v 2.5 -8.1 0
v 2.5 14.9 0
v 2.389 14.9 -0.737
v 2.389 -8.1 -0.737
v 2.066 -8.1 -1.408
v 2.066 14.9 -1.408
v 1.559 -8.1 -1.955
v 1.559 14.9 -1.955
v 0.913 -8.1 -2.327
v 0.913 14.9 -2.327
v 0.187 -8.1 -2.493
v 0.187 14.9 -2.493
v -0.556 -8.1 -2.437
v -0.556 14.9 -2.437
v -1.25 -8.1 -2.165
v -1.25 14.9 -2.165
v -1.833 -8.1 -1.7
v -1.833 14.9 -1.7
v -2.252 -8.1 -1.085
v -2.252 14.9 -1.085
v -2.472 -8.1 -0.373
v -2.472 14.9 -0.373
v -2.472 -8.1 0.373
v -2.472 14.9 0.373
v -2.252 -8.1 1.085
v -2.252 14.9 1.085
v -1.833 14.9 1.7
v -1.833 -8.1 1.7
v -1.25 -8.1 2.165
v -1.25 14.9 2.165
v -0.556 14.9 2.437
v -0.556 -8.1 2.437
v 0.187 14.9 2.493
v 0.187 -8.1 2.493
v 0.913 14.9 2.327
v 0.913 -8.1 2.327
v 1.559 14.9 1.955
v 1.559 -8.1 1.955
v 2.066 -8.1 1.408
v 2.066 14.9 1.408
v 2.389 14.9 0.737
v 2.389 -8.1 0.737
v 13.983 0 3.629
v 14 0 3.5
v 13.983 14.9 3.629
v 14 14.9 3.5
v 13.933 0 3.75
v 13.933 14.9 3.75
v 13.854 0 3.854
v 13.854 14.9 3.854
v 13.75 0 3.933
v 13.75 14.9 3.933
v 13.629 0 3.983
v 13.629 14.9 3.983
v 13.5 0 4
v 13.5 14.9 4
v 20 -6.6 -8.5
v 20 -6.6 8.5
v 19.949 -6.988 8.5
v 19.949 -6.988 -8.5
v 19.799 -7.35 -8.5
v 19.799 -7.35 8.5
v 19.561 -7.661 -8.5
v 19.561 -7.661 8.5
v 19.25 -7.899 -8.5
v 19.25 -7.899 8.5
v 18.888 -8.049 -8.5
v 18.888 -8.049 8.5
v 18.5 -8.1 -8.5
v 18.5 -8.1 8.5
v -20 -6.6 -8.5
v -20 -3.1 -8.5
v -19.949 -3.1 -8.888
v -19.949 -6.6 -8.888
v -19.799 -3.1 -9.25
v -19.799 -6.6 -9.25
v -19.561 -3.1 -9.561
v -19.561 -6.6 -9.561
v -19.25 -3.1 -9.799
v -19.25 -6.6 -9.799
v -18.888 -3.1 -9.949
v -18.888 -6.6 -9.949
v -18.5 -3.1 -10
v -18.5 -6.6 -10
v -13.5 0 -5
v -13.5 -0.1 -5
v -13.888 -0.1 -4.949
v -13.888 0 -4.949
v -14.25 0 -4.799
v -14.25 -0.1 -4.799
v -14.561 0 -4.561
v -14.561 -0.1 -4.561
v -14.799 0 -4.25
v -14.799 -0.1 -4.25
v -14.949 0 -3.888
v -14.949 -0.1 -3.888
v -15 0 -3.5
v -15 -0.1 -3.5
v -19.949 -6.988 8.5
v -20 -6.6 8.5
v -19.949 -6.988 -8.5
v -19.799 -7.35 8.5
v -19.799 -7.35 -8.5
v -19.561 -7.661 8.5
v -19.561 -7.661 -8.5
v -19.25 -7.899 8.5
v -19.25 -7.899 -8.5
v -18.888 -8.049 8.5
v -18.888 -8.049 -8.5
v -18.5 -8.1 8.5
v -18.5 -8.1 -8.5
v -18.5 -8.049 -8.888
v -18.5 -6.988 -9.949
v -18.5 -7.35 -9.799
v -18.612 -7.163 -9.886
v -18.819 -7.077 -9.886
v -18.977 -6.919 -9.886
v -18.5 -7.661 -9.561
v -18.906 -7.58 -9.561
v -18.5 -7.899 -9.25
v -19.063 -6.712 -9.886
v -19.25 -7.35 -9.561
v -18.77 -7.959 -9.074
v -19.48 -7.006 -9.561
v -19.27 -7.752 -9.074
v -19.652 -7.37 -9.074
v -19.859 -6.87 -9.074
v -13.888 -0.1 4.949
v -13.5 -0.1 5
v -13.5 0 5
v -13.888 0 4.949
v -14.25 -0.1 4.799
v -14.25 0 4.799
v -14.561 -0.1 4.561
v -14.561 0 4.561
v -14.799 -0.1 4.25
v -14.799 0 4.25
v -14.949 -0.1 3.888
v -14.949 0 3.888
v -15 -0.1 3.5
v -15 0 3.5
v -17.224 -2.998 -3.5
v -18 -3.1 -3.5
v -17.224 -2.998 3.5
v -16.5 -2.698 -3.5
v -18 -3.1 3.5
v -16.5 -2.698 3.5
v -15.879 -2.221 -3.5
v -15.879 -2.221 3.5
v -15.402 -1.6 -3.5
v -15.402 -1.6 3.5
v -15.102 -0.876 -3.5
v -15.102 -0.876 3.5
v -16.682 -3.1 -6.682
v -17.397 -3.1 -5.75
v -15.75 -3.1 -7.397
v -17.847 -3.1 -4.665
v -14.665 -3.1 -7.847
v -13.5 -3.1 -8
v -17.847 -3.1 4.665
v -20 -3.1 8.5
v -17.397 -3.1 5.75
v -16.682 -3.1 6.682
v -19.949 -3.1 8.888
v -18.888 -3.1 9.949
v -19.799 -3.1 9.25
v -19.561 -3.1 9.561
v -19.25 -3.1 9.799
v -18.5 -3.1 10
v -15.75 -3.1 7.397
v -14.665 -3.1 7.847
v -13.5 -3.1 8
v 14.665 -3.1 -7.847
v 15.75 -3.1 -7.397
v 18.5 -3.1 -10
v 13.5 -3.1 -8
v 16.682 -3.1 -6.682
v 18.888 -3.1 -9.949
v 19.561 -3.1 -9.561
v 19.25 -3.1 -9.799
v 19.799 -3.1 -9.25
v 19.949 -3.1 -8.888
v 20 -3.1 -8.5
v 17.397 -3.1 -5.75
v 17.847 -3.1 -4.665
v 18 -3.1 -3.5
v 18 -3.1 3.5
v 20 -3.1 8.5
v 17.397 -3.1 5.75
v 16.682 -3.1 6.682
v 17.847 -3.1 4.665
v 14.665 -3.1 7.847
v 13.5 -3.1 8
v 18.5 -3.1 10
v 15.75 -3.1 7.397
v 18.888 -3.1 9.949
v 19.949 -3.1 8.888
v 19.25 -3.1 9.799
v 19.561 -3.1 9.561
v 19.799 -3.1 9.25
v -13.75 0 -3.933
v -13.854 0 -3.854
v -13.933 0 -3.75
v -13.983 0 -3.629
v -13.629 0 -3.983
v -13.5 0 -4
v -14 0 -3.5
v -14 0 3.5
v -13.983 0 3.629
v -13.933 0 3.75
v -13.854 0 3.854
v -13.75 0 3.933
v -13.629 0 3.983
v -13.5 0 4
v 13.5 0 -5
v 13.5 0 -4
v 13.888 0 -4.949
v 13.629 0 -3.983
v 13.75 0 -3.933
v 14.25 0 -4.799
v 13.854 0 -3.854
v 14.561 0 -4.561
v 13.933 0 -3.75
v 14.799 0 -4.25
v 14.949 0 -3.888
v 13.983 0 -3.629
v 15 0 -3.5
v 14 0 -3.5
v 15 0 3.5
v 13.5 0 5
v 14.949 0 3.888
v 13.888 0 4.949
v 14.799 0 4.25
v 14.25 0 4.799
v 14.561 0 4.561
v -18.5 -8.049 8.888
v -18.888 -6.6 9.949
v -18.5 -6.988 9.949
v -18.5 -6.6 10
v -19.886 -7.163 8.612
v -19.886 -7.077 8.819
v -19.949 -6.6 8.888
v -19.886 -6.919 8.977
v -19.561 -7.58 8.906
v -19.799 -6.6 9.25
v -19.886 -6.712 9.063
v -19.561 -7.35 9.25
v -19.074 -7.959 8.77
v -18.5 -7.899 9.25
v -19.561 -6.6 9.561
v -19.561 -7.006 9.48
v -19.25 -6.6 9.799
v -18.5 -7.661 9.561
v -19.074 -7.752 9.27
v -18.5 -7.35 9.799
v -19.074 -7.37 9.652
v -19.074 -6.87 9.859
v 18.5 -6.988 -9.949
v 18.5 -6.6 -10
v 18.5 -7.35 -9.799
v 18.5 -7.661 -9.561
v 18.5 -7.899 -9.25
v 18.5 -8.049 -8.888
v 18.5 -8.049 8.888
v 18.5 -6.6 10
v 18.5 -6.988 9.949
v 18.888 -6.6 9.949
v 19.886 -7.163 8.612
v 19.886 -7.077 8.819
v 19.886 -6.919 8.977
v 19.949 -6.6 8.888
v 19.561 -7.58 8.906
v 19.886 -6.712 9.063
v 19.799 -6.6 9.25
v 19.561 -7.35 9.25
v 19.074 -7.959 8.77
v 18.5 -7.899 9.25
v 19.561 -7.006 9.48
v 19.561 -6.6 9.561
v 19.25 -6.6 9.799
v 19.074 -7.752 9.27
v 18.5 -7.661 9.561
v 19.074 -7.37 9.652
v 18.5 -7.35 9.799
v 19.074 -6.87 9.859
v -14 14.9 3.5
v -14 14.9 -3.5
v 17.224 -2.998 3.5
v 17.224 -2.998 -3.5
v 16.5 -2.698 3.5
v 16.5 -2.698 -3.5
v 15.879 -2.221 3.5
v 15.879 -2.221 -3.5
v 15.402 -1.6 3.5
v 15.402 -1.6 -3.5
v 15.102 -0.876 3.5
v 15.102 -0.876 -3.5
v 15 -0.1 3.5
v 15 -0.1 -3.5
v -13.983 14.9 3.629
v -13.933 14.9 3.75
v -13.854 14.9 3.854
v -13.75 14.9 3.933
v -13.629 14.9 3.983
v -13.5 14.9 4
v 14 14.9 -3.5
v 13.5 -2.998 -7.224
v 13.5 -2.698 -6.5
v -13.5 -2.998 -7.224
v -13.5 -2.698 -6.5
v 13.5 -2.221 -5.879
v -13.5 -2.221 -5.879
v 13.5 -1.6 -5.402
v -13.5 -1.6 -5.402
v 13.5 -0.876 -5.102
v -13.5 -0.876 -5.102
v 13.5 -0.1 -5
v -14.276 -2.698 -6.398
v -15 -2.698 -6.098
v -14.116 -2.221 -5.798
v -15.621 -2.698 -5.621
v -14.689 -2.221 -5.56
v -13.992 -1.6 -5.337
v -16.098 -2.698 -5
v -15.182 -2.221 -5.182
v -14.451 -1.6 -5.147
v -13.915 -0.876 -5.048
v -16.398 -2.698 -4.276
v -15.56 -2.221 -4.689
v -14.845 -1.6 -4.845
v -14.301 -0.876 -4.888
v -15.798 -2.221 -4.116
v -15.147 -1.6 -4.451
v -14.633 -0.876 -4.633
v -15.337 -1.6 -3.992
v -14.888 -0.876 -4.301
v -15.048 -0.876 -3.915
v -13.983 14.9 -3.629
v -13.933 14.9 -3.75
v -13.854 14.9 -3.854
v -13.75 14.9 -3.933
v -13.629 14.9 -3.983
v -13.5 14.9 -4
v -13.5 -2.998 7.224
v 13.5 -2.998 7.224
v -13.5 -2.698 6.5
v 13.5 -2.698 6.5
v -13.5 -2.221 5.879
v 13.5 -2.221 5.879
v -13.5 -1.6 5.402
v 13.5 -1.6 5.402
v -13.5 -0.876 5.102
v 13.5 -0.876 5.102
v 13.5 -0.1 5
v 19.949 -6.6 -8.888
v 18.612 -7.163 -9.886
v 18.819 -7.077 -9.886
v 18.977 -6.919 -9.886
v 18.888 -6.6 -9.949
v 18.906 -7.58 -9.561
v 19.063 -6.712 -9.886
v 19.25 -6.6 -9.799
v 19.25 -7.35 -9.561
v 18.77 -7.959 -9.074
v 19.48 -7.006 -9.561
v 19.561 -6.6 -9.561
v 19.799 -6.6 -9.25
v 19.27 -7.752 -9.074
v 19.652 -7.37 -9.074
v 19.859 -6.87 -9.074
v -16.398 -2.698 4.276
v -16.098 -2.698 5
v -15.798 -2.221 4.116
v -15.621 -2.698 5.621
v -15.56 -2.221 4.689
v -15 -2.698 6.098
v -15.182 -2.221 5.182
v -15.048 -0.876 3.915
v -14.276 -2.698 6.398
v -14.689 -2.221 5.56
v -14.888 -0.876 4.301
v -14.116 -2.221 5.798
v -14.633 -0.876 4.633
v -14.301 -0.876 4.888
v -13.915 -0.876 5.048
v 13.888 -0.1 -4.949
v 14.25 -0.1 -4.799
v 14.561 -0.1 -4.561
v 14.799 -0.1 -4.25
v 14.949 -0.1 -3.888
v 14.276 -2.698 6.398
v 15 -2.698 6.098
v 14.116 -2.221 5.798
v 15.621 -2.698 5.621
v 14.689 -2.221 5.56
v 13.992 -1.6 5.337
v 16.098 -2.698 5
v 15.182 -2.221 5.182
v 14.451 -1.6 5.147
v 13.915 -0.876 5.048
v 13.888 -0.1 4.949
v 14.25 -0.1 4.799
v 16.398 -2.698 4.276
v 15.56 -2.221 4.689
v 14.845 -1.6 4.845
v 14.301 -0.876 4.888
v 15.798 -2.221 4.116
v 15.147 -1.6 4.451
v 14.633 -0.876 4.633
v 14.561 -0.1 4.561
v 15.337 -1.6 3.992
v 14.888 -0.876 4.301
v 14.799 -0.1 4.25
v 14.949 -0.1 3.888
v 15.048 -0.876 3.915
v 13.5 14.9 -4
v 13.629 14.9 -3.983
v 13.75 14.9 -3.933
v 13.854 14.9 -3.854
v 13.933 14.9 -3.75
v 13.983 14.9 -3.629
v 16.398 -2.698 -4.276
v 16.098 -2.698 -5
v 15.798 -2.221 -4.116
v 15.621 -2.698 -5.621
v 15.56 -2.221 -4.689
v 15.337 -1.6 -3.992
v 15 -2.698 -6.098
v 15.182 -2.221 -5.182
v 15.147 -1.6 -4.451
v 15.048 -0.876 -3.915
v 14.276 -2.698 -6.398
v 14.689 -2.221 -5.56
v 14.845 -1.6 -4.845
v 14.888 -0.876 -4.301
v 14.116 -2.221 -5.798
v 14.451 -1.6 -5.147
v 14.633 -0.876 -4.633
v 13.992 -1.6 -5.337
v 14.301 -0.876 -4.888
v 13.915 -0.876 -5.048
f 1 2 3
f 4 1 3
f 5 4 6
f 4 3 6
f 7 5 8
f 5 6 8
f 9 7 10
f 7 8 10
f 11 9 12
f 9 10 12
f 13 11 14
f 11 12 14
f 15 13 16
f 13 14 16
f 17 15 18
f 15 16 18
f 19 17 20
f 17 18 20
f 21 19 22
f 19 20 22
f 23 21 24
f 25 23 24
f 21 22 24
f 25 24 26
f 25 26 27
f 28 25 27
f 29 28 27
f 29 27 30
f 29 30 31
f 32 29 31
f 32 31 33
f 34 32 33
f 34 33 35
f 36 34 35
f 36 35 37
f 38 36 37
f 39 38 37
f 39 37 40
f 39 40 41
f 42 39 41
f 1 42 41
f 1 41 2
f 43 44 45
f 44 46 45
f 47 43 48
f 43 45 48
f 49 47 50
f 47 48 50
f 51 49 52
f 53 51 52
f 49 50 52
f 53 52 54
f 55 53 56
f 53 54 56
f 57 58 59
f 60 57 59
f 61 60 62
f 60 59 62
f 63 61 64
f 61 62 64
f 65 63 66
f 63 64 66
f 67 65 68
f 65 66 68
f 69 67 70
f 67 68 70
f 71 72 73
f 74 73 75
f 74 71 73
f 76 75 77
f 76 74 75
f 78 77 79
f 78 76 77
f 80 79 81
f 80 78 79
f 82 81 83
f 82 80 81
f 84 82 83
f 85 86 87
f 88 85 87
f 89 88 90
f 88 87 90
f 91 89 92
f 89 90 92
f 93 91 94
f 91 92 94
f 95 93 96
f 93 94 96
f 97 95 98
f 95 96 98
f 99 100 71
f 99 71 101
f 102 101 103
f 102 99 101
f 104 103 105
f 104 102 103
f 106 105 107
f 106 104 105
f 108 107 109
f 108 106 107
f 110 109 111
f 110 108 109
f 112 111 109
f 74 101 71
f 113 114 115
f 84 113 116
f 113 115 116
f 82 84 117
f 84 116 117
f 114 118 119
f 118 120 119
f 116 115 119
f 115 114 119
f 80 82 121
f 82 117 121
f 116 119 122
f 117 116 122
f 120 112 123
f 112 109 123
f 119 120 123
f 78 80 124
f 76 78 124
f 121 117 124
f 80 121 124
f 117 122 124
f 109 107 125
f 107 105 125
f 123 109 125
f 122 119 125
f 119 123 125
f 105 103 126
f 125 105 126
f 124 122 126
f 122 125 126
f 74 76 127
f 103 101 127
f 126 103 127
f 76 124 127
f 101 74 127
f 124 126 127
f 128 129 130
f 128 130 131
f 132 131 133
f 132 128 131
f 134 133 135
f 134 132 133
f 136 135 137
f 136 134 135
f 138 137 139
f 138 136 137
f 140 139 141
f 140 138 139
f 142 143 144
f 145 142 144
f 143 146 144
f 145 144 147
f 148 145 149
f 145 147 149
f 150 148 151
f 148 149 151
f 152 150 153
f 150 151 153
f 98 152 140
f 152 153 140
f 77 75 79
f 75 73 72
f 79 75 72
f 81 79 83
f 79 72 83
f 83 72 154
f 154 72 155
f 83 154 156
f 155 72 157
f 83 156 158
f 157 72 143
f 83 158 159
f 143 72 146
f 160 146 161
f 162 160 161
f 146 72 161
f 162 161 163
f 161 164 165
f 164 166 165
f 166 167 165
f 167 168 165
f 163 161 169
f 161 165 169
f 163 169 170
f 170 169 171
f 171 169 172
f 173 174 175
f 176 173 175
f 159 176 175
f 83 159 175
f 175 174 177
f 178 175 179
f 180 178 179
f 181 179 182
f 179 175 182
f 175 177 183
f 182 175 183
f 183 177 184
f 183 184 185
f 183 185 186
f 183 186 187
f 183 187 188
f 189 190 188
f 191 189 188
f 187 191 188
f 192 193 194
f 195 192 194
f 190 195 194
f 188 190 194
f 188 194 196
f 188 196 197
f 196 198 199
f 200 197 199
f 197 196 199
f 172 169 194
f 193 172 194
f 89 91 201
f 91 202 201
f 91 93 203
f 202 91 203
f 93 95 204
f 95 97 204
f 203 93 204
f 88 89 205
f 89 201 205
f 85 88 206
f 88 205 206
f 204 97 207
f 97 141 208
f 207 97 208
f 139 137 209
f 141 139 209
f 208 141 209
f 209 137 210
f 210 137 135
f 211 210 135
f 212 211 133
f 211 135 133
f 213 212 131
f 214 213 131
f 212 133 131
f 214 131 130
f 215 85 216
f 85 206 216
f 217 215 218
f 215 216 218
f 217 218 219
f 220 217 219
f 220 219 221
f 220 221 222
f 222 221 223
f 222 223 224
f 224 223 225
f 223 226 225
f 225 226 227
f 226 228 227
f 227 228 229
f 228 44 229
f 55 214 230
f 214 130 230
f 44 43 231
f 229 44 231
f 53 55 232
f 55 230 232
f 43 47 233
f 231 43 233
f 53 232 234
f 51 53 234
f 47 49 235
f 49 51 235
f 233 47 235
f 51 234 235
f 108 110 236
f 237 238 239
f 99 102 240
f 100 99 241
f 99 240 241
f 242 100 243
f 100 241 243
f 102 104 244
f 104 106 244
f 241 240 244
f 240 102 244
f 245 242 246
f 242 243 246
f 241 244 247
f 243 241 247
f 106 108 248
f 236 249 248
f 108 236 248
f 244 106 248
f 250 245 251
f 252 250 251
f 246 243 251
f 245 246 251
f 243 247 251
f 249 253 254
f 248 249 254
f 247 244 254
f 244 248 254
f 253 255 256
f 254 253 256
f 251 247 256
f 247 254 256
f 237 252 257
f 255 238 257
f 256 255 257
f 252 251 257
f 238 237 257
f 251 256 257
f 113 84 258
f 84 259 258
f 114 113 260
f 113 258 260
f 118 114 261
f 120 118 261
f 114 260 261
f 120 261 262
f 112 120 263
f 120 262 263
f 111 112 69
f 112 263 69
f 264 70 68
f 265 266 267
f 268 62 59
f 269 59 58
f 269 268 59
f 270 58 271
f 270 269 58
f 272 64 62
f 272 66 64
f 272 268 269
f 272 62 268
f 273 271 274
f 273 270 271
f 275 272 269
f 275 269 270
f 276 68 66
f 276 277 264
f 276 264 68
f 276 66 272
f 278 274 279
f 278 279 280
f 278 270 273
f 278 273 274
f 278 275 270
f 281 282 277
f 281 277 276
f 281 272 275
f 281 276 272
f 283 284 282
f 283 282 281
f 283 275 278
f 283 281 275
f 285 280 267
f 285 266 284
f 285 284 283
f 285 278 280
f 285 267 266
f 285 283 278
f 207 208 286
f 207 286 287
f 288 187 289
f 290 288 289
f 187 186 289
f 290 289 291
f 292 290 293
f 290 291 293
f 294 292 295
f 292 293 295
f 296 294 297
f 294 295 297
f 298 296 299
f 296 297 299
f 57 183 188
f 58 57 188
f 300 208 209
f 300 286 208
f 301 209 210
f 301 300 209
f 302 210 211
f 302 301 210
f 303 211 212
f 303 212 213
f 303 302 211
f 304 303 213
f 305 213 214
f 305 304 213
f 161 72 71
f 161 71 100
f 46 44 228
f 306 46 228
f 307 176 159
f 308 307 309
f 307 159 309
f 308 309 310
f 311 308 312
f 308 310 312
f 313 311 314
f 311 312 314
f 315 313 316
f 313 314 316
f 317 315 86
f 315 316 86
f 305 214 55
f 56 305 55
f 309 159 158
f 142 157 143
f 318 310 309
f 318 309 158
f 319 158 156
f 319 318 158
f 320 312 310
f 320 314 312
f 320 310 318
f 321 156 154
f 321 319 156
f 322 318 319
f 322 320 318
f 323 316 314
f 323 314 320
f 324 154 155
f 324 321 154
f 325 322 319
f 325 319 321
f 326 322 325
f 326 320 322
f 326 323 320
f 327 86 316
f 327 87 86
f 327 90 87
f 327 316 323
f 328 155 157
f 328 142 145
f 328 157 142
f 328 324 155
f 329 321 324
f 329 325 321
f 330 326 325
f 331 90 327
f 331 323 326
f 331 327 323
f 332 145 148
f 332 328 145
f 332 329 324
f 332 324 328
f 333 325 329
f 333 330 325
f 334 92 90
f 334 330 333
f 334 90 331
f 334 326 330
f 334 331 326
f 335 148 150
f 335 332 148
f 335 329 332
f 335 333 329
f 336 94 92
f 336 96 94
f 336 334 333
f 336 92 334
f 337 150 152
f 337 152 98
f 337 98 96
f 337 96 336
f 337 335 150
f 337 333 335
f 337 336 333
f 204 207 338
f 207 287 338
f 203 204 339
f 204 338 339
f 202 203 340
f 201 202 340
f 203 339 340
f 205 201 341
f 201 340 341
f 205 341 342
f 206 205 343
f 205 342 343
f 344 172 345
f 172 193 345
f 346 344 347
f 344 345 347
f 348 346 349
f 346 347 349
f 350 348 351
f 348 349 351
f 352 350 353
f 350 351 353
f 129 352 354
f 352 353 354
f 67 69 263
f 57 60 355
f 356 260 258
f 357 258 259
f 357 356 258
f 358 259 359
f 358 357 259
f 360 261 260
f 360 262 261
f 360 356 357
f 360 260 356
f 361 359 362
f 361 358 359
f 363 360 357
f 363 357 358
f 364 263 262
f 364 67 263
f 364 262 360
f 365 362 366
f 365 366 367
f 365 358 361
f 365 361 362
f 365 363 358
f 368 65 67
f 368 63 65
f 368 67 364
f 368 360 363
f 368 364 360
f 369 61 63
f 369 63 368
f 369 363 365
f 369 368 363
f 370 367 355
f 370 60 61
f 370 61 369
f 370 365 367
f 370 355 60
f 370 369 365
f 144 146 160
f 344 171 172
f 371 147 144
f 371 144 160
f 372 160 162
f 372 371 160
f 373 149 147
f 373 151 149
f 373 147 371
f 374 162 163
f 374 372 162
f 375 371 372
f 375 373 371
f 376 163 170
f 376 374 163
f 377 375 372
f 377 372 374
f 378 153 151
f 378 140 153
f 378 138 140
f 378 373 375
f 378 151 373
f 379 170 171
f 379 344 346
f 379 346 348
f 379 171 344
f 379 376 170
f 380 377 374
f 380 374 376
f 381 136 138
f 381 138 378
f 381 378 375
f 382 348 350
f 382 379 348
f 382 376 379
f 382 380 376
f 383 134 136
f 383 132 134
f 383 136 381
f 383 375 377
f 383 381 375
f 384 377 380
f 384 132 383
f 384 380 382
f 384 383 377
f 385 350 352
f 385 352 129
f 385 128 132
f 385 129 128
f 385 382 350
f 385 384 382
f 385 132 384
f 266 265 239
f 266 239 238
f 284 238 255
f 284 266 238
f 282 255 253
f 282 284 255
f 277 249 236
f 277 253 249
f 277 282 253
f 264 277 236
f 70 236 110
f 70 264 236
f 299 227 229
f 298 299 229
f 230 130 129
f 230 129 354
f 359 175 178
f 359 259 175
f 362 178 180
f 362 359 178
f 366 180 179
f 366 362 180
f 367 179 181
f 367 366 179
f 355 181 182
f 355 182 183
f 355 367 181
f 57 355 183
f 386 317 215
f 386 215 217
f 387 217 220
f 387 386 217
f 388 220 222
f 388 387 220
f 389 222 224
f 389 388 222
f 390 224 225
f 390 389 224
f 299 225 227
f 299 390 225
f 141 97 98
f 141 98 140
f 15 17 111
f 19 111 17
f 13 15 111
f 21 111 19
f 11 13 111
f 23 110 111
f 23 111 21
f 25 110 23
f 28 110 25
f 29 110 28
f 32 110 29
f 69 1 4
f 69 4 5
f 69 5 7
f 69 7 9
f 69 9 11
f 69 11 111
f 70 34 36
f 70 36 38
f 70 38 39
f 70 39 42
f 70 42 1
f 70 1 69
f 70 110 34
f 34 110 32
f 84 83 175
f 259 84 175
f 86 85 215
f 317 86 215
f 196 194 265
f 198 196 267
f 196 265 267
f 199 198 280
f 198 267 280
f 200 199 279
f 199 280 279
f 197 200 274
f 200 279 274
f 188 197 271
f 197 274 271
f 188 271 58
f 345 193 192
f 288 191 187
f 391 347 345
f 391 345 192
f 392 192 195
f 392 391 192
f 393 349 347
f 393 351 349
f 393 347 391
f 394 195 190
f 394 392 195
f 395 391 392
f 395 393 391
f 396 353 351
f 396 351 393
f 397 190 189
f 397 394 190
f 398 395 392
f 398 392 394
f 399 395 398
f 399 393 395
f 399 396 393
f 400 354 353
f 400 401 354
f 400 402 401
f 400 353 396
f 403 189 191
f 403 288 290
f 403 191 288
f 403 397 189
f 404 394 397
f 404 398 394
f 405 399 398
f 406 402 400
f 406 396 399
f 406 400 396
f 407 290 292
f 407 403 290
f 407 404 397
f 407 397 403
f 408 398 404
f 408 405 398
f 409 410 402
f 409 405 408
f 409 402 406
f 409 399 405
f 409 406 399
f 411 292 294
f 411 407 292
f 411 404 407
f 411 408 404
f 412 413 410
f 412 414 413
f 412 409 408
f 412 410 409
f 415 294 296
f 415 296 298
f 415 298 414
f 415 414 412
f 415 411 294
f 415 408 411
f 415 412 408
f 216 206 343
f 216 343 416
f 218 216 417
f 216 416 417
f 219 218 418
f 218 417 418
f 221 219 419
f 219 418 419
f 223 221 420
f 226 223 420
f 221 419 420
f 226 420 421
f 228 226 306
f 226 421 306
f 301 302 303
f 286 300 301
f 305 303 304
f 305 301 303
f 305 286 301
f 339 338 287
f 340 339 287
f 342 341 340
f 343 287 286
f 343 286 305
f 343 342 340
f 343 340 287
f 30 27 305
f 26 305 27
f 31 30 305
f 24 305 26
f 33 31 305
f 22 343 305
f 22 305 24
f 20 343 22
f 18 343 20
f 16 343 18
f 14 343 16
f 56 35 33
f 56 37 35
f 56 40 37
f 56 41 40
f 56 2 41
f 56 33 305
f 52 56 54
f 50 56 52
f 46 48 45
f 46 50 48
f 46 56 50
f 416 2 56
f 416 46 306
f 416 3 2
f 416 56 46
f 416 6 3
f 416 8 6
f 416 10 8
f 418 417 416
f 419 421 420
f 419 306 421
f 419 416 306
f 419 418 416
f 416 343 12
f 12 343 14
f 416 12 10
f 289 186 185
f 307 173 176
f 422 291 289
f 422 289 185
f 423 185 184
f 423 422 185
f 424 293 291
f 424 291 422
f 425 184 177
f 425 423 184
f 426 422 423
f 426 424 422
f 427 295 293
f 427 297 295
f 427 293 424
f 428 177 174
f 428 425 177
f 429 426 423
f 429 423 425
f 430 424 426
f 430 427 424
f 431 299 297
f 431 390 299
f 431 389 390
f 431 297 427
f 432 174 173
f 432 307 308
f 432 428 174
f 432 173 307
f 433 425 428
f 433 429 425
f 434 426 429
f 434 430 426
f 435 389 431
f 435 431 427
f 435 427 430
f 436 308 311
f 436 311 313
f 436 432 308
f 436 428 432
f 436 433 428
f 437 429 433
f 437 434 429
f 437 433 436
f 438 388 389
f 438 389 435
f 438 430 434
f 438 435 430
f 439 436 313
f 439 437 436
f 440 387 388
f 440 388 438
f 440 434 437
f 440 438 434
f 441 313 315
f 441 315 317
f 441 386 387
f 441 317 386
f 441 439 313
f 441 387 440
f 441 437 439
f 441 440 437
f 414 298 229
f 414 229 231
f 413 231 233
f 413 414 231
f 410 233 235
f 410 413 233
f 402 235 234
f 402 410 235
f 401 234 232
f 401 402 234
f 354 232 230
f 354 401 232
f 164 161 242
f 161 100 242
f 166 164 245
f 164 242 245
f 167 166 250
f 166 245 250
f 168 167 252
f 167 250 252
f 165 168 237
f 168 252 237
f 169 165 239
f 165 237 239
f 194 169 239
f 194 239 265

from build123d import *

# Parameters (mm, degrees)
SKETCH_W     = 30
SKETCH_H     = 10
PAD_DEPTH    = 3.1
SKETCH001_W  = 40
SKETCH001_H  = 20
PAD001_DEPTH = 5
FILLET_R     = 1.5
FILLET001_R  = 3
FILLET002_R  = 1.5
SKETCH002_W  = 28
SKETCH002_H  = 8
PAD002_DEPTH = 14.9
FILLET003_R  = 0.5
SKETCH003_R  = 2.5
POCKET_DEPTH = 25


with BuildPart() as part:
    # Sketch → Pad (new body)
    with BuildSketch(Plane.XZ):
        Rectangle(SKETCH_W, SKETCH_H)
    extrude(amount=PAD_DEPTH)

    # Sketch001 (on Face6 of Pad) → Pad001 (join)
    with BuildSketch(Plane.XZ.offset(3.1)):
        Rectangle(SKETCH001_W, SKETCH001_H)
    extrude(amount=PAD001_DEPTH)

    # Fillet
    fillet_edges = [part.edges().sort_by_distance(p)[0] for p in [
        (15, -1.55, 5),
        (15, -1.55, -5),
        (-15, -1.55, 5),
        (-15, -1.55, -5),
    ]]
    fillet(fillet_edges, radius=FILLET_R)

    # Fillet001
    fillet001_edges = [part.edges().sort_by_distance(p)[0] for p in [
        (0, -3.1, 5),
    ]]
    fillet(fillet001_edges, radius=FILLET001_R)

    # Fillet002
    fillet002_edges = [part.edges().sort_by_distance(p)[0] for p in [
        (0, -8.1, 10),
        (-20, -8.1, 0),
        (20, -8.1, 0),
        (0, -8.1, -10),
        (20, -5.6, 10),
        (-20, -5.6, 10),
        (20, -5.6, -10),
        (-20, -5.6, -10),
    ]]
    fillet(fillet002_edges, radius=FILLET002_R)

    # Sketch002 (on Face4 of Fillet001) → Pad002 (join)
    with BuildSketch(Plane(origin=(0, 0, 0), x_dir=(1, 0, 0), z_dir=(0, 1, 0))):
        Rectangle(SKETCH002_W, SKETCH002_H)
    extrude(amount=PAD002_DEPTH)

    # Fillet003
    fillet003_edges = [part.edges().sort_by_distance(p)[0] for p in [
        (14, 7.45, 4),
        (-14, 7.45, 4),
        (-14, 7.45, -4),
        (14, 7.45, -4),
    ]]
    fillet(fillet003_edges, radius=FILLET003_R)

    # Sketch003 (on Face18 of Fillet003) → Pocket (cut)
    with BuildSketch(Plane(origin=(0, 14.9, 0), x_dir=(1, 0, 0), z_dir=(0, 1, 0))):
        Circle(SKETCH003_R)
    extrude(amount=-POCKET_DEPTH, mode=Mode.SUBTRACT)


solid = part.part
